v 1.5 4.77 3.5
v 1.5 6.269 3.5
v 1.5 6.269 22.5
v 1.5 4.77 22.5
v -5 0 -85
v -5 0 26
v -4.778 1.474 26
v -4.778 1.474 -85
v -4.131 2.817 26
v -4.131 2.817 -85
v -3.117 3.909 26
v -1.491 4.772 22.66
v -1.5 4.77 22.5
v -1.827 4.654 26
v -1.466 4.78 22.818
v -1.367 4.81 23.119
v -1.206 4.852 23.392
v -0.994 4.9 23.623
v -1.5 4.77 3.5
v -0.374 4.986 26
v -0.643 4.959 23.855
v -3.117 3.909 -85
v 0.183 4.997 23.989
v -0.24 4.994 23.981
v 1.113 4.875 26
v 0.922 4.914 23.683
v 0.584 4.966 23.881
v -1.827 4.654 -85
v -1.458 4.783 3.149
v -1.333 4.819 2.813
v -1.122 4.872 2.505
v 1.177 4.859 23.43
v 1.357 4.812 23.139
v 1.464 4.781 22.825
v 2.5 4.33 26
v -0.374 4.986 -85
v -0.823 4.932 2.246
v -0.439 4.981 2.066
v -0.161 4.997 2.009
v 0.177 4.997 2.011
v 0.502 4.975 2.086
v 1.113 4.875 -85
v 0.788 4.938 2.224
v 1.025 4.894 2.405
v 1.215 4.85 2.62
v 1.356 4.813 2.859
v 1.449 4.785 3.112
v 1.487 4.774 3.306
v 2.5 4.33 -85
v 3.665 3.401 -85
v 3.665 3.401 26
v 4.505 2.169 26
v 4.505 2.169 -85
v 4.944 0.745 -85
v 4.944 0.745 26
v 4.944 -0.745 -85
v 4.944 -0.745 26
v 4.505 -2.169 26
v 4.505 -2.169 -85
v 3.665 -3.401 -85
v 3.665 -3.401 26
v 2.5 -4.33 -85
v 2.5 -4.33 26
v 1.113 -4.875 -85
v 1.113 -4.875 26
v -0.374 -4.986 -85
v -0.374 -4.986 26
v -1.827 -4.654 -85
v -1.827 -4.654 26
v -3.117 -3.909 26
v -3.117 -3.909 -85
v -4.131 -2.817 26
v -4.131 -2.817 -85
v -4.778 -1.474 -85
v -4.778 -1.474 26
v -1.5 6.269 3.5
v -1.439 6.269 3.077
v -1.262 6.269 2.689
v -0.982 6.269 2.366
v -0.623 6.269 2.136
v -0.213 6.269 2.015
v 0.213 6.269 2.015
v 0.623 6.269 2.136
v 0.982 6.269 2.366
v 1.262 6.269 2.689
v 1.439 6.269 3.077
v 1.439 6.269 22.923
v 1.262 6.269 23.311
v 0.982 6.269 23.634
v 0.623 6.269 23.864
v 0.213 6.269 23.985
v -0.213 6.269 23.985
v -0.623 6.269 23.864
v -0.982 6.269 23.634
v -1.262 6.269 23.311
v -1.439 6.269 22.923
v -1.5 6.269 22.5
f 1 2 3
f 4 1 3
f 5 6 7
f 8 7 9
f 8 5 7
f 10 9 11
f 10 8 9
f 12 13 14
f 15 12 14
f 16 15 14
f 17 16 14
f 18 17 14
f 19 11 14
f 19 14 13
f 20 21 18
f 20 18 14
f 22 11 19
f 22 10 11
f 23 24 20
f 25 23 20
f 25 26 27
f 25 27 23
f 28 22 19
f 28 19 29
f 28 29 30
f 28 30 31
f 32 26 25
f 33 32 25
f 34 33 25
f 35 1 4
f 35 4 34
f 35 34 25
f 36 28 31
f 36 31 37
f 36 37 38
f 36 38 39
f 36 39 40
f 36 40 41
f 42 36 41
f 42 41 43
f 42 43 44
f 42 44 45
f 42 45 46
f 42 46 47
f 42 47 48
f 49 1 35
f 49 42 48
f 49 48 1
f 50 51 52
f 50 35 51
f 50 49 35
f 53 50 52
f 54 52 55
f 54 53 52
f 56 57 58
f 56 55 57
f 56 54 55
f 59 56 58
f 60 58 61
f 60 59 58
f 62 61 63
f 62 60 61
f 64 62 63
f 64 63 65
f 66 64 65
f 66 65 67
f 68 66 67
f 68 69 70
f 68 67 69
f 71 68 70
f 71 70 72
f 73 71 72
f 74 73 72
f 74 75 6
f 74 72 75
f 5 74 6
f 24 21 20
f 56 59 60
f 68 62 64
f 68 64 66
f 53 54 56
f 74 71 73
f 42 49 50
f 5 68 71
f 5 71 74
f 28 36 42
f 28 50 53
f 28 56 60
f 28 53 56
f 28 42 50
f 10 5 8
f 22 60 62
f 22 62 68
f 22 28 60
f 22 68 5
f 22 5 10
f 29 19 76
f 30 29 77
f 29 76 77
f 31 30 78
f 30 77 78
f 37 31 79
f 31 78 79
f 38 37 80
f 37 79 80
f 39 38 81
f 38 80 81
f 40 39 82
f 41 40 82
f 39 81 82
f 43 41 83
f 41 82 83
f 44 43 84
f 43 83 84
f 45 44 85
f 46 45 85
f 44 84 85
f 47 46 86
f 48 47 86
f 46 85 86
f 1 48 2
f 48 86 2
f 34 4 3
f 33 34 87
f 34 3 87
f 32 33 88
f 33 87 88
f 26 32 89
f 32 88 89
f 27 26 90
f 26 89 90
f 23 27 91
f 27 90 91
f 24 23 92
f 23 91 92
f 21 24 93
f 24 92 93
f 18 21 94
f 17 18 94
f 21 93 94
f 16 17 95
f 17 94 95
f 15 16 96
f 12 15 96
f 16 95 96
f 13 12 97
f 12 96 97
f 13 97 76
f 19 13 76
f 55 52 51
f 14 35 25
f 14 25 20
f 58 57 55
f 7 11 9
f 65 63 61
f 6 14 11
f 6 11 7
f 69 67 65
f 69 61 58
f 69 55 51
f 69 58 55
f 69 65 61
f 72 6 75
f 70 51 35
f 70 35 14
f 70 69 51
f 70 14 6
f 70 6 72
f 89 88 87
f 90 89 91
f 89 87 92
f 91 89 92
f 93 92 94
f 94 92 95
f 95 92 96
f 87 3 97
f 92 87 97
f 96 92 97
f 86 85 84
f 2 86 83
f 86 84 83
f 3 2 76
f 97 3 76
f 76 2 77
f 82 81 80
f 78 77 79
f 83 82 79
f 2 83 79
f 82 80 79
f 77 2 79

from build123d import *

# Parameters (mm, degrees)
SKETCH_1_R           = 5
EXTRUDE_1_DEPTH      = 26
EXTRUDE_START        = 85
SKETCH_3_R           = 5
EXTRUDE_3_DEPTH      = 85
EXTRUDE_4_REACH      = 87.889
EXTRUDE_4_END_RADIUS = 5


with BuildPart() as part:
    # 草图1 → 凸台-拉伸1 (new body)
    with BuildSketch(Plane.XY):
        with Locations(Location((0, 0, 0), (0, 0, 180))):
            Circle(SKETCH_1_R)
    extrude(amount=EXTRUDE_1_DEPTH)

    # 草图3 → 凸台-拉伸3 (add)
    with BuildSketch(Plane(origin=(0, 0, 0), x_dir=(-1, 0, 0), z_dir=(0, 0, -1)).offset(EXTRUDE_START)):
        Circle(SKETCH_3_R)
    extrude(amount=-EXTRUDE_3_DEPTH)

    # 凸台-拉伸4: up to this cylinder (the profile starts outside it)
    extrude_4_end = Plane(origin=(0, 0, 13), z_dir=(0, 0, -1)) * Cylinder(EXTRUDE_4_END_RADIUS, 186.778, mode=Mode.PRIVATE)
    # 草图5 → 凸台-拉伸4 (add, up to the surface)
    with BuildSketch(Plane(origin=(0, 6.269, 0), x_dir=(1, 0, 0), z_dir=(0, 1, 0)), mode=Mode.PRIVATE) as extrude_4_sk1:
        with BuildLine():
            Line((1.5, -3.5), (1.5, -22.5))
            ThreePointArc((1.5, -22.5), (0, -24), (-1.5, -22.5))
            Line((-1.5, -22.5), (-1.5, -3.5))
            ThreePointArc((-1.5, -3.5), (0, -2), (1.5, -3.5))
        make_face()
    extrude_4_tool1 = extrude(extrude_4_sk1.sketch, amount=-EXTRUDE_4_REACH, mode=Mode.PRIVATE) - extrude_4_end
    add(extrude_4_tool1.solids().sort_by_distance((0, 6.269, 13))[0])


solid = part.part
